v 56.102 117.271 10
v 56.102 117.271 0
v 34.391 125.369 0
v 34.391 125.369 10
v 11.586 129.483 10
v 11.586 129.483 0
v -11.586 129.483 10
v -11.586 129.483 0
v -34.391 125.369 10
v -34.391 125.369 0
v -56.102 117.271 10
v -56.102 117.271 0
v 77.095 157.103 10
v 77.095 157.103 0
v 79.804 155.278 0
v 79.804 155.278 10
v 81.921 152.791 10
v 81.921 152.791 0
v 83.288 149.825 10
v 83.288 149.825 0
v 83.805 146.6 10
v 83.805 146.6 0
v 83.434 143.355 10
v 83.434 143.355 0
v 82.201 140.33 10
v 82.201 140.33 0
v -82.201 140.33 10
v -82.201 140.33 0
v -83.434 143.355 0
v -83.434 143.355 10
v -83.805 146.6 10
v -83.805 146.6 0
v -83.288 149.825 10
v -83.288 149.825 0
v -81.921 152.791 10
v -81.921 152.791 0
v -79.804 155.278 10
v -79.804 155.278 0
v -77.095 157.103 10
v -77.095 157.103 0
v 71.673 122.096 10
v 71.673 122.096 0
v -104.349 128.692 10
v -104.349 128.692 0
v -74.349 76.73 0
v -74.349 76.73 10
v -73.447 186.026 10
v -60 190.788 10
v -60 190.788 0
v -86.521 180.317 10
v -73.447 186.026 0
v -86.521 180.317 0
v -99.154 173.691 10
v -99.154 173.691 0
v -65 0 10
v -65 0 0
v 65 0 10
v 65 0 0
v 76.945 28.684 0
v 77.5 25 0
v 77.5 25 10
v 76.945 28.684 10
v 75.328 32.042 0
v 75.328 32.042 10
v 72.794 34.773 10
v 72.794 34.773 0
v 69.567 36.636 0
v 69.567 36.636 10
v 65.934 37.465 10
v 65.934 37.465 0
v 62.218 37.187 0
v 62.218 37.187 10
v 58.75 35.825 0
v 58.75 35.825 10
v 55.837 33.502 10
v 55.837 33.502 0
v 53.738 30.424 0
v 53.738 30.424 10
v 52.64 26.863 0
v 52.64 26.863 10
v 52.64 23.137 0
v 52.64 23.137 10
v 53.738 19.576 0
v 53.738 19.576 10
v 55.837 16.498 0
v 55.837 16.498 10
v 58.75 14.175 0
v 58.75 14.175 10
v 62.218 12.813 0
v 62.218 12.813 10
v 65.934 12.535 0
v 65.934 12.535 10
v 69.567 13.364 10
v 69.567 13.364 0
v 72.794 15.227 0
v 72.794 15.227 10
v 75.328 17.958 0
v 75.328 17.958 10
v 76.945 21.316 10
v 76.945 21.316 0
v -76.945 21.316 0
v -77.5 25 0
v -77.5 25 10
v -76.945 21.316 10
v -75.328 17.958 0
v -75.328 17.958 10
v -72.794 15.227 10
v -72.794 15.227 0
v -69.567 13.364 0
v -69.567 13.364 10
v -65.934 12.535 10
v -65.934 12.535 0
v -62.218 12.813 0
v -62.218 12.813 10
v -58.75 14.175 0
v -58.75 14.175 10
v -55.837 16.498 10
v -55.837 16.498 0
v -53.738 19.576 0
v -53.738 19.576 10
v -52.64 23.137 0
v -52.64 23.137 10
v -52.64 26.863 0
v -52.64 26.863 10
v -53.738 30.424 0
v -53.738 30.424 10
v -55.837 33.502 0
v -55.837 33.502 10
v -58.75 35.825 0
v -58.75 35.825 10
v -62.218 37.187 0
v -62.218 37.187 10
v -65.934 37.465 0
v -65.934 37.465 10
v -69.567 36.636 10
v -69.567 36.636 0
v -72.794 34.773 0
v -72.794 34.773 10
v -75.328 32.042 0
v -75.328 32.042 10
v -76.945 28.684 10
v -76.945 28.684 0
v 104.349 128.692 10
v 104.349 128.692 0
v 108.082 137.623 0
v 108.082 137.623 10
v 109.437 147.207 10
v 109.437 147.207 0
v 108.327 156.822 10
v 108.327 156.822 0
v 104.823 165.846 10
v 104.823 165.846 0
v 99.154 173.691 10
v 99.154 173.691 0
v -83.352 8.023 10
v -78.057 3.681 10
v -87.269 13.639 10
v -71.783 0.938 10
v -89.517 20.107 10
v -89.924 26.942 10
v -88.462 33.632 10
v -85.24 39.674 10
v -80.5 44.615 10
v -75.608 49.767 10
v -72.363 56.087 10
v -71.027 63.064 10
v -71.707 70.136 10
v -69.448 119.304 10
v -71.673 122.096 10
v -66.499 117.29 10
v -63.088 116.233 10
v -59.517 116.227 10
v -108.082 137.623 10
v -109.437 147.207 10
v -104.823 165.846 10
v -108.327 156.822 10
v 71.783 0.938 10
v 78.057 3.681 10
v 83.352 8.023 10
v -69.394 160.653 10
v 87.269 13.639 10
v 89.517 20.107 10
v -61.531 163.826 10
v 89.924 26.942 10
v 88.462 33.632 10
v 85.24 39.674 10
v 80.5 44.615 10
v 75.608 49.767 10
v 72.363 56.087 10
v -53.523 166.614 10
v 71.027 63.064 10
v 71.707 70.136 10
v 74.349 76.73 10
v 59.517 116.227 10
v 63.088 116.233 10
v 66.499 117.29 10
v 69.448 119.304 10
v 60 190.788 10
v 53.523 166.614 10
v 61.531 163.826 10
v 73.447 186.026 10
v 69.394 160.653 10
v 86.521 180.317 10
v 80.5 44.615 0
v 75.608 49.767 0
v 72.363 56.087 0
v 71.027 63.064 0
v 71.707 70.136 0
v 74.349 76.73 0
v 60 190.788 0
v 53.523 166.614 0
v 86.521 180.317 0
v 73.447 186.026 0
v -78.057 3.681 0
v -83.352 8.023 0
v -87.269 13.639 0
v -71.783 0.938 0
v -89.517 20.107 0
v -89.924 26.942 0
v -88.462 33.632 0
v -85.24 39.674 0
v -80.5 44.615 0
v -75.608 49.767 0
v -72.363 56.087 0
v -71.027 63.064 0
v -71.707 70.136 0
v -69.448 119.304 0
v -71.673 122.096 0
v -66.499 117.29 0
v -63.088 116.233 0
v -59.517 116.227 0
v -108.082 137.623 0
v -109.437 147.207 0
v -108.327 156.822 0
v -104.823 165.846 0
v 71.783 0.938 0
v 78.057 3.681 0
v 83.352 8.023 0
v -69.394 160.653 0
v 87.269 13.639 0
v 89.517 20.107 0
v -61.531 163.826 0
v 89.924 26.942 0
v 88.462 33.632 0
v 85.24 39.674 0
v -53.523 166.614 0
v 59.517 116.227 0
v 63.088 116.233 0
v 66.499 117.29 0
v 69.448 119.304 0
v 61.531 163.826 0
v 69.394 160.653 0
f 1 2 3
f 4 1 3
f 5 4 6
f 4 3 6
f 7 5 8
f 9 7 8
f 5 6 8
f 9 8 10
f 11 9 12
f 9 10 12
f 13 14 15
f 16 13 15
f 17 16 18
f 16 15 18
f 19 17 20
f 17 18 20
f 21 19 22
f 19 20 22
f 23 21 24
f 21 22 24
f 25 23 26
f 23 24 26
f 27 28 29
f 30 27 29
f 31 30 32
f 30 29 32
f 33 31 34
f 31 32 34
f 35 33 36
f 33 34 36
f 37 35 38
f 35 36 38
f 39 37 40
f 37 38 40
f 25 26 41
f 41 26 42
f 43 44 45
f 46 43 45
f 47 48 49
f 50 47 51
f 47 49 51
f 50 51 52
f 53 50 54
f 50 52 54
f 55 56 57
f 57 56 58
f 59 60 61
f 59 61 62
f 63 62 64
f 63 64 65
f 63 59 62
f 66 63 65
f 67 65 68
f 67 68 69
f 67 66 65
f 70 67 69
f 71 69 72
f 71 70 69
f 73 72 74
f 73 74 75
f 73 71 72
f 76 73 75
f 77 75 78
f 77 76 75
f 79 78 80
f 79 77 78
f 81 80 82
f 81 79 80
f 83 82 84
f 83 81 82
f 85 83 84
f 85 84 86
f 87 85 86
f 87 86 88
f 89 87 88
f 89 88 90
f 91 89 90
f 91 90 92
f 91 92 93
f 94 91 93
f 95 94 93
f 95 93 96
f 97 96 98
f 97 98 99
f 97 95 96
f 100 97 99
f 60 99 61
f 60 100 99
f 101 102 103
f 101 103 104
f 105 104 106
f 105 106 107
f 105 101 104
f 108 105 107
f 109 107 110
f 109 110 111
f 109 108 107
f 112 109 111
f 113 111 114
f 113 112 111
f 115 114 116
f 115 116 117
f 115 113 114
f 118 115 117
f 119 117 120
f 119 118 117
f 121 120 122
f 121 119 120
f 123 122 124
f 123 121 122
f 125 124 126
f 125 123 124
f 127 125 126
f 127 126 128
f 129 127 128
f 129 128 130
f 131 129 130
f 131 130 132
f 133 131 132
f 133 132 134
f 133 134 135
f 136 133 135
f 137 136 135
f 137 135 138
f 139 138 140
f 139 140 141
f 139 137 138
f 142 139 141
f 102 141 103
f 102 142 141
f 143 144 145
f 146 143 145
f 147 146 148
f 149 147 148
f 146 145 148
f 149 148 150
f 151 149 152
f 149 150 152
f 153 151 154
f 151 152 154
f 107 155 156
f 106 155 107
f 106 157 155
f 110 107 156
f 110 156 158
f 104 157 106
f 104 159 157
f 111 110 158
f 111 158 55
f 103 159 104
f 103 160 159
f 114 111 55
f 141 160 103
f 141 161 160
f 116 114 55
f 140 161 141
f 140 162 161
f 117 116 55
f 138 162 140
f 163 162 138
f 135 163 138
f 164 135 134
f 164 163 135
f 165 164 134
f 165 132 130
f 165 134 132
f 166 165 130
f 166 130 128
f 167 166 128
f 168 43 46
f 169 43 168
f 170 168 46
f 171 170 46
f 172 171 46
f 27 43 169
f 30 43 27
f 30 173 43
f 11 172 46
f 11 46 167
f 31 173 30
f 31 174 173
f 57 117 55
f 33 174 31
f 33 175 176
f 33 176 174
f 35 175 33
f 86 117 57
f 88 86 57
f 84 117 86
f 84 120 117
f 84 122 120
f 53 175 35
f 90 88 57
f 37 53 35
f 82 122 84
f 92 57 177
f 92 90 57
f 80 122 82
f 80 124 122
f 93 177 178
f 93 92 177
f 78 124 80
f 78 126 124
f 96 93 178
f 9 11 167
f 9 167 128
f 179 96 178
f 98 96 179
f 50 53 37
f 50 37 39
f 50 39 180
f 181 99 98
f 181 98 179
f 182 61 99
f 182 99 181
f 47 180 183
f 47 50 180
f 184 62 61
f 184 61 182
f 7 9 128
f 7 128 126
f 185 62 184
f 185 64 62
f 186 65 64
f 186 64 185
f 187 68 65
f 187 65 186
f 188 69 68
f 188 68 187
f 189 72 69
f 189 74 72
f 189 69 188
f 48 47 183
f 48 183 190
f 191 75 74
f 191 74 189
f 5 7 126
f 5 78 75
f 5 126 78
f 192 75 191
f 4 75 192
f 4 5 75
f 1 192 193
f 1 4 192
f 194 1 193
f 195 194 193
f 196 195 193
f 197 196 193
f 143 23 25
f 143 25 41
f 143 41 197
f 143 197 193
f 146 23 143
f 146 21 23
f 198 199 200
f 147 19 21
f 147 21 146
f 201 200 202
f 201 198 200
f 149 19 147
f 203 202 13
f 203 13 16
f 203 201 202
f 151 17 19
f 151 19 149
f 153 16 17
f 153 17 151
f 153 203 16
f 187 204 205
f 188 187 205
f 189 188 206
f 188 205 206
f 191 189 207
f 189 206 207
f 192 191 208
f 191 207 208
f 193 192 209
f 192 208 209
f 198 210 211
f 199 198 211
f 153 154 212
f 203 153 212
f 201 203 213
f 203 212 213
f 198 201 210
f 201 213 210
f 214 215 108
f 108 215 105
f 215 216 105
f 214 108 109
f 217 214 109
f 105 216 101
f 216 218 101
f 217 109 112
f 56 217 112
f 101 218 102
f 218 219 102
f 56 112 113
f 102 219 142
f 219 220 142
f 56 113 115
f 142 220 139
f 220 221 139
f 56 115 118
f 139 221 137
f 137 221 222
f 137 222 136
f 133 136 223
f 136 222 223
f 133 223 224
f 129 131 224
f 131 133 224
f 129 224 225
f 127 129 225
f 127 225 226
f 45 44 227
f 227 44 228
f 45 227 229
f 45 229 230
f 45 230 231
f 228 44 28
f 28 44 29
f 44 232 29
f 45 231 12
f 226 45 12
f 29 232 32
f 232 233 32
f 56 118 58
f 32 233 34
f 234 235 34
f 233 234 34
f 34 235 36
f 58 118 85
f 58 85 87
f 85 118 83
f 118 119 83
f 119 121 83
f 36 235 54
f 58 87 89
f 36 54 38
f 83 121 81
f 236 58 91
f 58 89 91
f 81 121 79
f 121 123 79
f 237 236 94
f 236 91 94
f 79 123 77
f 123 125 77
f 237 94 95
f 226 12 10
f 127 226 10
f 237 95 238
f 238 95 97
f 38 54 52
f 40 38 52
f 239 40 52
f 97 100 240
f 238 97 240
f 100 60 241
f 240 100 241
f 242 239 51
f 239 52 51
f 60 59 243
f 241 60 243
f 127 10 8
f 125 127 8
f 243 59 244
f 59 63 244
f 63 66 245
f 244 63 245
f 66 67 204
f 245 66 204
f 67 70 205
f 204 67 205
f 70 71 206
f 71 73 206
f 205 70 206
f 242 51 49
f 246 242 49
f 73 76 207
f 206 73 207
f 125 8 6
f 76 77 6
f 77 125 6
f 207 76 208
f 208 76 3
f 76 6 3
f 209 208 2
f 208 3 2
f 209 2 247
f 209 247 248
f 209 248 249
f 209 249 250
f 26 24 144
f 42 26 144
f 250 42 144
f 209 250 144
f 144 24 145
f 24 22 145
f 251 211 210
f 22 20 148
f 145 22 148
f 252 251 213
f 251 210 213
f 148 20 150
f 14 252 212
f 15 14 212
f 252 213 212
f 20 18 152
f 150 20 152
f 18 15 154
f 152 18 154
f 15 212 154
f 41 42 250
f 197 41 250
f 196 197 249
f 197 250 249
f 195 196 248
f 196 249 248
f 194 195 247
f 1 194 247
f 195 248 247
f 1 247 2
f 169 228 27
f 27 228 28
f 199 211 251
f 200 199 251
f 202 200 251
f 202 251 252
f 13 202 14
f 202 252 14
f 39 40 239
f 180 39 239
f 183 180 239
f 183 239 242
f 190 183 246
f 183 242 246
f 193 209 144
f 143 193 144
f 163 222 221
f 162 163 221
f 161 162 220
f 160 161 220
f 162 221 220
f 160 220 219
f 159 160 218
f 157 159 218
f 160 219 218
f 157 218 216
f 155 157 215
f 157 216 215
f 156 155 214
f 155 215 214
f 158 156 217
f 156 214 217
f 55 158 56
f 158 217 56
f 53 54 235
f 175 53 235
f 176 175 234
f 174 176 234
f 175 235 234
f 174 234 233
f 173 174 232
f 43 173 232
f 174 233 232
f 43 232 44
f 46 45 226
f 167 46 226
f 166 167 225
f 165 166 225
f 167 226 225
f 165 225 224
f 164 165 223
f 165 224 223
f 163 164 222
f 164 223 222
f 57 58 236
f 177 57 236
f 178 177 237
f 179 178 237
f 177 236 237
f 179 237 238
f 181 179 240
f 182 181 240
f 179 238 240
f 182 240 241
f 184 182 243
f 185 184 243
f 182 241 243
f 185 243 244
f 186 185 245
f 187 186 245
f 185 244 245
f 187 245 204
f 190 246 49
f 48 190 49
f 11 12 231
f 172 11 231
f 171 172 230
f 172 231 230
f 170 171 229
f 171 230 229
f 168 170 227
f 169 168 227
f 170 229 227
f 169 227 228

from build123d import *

# Parameters (mm, degrees)
CROQUIS1_R              = 12.5
SALIENTE_EXTRUIR3_DEPTH = 10


with BuildPart() as part:
    # Croquis1 → Saliente-Extruir3 (new body)
    with BuildSketch(Plane.XY):
        with BuildLine():
            Line((-65, 0), (65, 0))
            ThreePointArc((65, 0), (88.615469852, 16.795758191), (80.499762007, 44.615233308))
            ThreePointArc((80.499762007, 44.615233308), (71.445806296, 59.527813514), (74.34888892, 76.730466615))
            Line((74.34888892, 76.730466615), (104.34888892, 128.691990842))
            ThreePointArc((104.34888892, 128.691990842), (109.189179993, 152.050160185), (99.153741511, 173.690919579))
            ThreePointArc((99.153741511, 173.690919579), (80.034708306, 183.287875939), (60, 190.787840283))
            Line((60, 190.787840283), (53.522714622, 166.614282159))
            ThreePointArc((53.522714622, 166.614282159), (65.481747035, 162.287217011), (77.094946128, 157.103053062))
            ThreePointArc((77.094946128, 157.103053062), (83.288324785, 149.82485993), (82.200740382, 140.330272281))
            Line((82.200740382, 140.330272281), (71.673300788, 122.09621203))
            ThreePointArc((71.673300788, 122.09621203), (64.832856812, 116.63391364), (56.102320229, 117.271180027))
            ThreePointArc((56.102320229, 117.271180027), (0, 130), (-56.102320229, 117.271180027))
            ThreePointArc((-56.102320229, 117.271180027), (-64.832856812, 116.63391364), (-71.673300788, 122.09621203))
            Line((-71.673300788, 122.09621203), (-82.200740382, 140.330272281))
            ThreePointArc((-82.200740382, 140.330272281), (-83.288324785, 149.82485993), (-77.094946128, 157.103053062))
            ThreePointArc((-77.094946128, 157.103053062), (-65.481747035, 162.287217011), (-53.522714622, 166.614282159))
            Line((-53.522714622, 166.614282159), (-60, 190.787840283))
            ThreePointArc((-60, 190.787840283), (-80.034708306, 183.287875939), (-99.153741511, 173.690919579))
            ThreePointArc((-99.153741511, 173.690919579), (-109.189179993, 152.050160185), (-104.34888892, 128.691990842))
            Line((-104.34888892, 128.691990842), (-74.34888892, 76.730466615))
            ThreePointArc((-74.34888892, 76.730466615), (-71.445806296, 59.527813514), (-80.499762007, 44.615233308))
            ThreePointArc((-80.499762007, 44.615233308), (-88.615469852, 16.795758191), (-65, 0))
        make_face()
        with Locations((65, 25)):
            Circle(CROQUIS1_R, mode=Mode.SUBTRACT)
        with Locations(Location((-65, 25, 0), (0, 0, 180))):
            Circle(CROQUIS1_R, mode=Mode.SUBTRACT)
    extrude(amount=SALIENTE_EXTRUIR3_DEPTH)


solid = part.part
